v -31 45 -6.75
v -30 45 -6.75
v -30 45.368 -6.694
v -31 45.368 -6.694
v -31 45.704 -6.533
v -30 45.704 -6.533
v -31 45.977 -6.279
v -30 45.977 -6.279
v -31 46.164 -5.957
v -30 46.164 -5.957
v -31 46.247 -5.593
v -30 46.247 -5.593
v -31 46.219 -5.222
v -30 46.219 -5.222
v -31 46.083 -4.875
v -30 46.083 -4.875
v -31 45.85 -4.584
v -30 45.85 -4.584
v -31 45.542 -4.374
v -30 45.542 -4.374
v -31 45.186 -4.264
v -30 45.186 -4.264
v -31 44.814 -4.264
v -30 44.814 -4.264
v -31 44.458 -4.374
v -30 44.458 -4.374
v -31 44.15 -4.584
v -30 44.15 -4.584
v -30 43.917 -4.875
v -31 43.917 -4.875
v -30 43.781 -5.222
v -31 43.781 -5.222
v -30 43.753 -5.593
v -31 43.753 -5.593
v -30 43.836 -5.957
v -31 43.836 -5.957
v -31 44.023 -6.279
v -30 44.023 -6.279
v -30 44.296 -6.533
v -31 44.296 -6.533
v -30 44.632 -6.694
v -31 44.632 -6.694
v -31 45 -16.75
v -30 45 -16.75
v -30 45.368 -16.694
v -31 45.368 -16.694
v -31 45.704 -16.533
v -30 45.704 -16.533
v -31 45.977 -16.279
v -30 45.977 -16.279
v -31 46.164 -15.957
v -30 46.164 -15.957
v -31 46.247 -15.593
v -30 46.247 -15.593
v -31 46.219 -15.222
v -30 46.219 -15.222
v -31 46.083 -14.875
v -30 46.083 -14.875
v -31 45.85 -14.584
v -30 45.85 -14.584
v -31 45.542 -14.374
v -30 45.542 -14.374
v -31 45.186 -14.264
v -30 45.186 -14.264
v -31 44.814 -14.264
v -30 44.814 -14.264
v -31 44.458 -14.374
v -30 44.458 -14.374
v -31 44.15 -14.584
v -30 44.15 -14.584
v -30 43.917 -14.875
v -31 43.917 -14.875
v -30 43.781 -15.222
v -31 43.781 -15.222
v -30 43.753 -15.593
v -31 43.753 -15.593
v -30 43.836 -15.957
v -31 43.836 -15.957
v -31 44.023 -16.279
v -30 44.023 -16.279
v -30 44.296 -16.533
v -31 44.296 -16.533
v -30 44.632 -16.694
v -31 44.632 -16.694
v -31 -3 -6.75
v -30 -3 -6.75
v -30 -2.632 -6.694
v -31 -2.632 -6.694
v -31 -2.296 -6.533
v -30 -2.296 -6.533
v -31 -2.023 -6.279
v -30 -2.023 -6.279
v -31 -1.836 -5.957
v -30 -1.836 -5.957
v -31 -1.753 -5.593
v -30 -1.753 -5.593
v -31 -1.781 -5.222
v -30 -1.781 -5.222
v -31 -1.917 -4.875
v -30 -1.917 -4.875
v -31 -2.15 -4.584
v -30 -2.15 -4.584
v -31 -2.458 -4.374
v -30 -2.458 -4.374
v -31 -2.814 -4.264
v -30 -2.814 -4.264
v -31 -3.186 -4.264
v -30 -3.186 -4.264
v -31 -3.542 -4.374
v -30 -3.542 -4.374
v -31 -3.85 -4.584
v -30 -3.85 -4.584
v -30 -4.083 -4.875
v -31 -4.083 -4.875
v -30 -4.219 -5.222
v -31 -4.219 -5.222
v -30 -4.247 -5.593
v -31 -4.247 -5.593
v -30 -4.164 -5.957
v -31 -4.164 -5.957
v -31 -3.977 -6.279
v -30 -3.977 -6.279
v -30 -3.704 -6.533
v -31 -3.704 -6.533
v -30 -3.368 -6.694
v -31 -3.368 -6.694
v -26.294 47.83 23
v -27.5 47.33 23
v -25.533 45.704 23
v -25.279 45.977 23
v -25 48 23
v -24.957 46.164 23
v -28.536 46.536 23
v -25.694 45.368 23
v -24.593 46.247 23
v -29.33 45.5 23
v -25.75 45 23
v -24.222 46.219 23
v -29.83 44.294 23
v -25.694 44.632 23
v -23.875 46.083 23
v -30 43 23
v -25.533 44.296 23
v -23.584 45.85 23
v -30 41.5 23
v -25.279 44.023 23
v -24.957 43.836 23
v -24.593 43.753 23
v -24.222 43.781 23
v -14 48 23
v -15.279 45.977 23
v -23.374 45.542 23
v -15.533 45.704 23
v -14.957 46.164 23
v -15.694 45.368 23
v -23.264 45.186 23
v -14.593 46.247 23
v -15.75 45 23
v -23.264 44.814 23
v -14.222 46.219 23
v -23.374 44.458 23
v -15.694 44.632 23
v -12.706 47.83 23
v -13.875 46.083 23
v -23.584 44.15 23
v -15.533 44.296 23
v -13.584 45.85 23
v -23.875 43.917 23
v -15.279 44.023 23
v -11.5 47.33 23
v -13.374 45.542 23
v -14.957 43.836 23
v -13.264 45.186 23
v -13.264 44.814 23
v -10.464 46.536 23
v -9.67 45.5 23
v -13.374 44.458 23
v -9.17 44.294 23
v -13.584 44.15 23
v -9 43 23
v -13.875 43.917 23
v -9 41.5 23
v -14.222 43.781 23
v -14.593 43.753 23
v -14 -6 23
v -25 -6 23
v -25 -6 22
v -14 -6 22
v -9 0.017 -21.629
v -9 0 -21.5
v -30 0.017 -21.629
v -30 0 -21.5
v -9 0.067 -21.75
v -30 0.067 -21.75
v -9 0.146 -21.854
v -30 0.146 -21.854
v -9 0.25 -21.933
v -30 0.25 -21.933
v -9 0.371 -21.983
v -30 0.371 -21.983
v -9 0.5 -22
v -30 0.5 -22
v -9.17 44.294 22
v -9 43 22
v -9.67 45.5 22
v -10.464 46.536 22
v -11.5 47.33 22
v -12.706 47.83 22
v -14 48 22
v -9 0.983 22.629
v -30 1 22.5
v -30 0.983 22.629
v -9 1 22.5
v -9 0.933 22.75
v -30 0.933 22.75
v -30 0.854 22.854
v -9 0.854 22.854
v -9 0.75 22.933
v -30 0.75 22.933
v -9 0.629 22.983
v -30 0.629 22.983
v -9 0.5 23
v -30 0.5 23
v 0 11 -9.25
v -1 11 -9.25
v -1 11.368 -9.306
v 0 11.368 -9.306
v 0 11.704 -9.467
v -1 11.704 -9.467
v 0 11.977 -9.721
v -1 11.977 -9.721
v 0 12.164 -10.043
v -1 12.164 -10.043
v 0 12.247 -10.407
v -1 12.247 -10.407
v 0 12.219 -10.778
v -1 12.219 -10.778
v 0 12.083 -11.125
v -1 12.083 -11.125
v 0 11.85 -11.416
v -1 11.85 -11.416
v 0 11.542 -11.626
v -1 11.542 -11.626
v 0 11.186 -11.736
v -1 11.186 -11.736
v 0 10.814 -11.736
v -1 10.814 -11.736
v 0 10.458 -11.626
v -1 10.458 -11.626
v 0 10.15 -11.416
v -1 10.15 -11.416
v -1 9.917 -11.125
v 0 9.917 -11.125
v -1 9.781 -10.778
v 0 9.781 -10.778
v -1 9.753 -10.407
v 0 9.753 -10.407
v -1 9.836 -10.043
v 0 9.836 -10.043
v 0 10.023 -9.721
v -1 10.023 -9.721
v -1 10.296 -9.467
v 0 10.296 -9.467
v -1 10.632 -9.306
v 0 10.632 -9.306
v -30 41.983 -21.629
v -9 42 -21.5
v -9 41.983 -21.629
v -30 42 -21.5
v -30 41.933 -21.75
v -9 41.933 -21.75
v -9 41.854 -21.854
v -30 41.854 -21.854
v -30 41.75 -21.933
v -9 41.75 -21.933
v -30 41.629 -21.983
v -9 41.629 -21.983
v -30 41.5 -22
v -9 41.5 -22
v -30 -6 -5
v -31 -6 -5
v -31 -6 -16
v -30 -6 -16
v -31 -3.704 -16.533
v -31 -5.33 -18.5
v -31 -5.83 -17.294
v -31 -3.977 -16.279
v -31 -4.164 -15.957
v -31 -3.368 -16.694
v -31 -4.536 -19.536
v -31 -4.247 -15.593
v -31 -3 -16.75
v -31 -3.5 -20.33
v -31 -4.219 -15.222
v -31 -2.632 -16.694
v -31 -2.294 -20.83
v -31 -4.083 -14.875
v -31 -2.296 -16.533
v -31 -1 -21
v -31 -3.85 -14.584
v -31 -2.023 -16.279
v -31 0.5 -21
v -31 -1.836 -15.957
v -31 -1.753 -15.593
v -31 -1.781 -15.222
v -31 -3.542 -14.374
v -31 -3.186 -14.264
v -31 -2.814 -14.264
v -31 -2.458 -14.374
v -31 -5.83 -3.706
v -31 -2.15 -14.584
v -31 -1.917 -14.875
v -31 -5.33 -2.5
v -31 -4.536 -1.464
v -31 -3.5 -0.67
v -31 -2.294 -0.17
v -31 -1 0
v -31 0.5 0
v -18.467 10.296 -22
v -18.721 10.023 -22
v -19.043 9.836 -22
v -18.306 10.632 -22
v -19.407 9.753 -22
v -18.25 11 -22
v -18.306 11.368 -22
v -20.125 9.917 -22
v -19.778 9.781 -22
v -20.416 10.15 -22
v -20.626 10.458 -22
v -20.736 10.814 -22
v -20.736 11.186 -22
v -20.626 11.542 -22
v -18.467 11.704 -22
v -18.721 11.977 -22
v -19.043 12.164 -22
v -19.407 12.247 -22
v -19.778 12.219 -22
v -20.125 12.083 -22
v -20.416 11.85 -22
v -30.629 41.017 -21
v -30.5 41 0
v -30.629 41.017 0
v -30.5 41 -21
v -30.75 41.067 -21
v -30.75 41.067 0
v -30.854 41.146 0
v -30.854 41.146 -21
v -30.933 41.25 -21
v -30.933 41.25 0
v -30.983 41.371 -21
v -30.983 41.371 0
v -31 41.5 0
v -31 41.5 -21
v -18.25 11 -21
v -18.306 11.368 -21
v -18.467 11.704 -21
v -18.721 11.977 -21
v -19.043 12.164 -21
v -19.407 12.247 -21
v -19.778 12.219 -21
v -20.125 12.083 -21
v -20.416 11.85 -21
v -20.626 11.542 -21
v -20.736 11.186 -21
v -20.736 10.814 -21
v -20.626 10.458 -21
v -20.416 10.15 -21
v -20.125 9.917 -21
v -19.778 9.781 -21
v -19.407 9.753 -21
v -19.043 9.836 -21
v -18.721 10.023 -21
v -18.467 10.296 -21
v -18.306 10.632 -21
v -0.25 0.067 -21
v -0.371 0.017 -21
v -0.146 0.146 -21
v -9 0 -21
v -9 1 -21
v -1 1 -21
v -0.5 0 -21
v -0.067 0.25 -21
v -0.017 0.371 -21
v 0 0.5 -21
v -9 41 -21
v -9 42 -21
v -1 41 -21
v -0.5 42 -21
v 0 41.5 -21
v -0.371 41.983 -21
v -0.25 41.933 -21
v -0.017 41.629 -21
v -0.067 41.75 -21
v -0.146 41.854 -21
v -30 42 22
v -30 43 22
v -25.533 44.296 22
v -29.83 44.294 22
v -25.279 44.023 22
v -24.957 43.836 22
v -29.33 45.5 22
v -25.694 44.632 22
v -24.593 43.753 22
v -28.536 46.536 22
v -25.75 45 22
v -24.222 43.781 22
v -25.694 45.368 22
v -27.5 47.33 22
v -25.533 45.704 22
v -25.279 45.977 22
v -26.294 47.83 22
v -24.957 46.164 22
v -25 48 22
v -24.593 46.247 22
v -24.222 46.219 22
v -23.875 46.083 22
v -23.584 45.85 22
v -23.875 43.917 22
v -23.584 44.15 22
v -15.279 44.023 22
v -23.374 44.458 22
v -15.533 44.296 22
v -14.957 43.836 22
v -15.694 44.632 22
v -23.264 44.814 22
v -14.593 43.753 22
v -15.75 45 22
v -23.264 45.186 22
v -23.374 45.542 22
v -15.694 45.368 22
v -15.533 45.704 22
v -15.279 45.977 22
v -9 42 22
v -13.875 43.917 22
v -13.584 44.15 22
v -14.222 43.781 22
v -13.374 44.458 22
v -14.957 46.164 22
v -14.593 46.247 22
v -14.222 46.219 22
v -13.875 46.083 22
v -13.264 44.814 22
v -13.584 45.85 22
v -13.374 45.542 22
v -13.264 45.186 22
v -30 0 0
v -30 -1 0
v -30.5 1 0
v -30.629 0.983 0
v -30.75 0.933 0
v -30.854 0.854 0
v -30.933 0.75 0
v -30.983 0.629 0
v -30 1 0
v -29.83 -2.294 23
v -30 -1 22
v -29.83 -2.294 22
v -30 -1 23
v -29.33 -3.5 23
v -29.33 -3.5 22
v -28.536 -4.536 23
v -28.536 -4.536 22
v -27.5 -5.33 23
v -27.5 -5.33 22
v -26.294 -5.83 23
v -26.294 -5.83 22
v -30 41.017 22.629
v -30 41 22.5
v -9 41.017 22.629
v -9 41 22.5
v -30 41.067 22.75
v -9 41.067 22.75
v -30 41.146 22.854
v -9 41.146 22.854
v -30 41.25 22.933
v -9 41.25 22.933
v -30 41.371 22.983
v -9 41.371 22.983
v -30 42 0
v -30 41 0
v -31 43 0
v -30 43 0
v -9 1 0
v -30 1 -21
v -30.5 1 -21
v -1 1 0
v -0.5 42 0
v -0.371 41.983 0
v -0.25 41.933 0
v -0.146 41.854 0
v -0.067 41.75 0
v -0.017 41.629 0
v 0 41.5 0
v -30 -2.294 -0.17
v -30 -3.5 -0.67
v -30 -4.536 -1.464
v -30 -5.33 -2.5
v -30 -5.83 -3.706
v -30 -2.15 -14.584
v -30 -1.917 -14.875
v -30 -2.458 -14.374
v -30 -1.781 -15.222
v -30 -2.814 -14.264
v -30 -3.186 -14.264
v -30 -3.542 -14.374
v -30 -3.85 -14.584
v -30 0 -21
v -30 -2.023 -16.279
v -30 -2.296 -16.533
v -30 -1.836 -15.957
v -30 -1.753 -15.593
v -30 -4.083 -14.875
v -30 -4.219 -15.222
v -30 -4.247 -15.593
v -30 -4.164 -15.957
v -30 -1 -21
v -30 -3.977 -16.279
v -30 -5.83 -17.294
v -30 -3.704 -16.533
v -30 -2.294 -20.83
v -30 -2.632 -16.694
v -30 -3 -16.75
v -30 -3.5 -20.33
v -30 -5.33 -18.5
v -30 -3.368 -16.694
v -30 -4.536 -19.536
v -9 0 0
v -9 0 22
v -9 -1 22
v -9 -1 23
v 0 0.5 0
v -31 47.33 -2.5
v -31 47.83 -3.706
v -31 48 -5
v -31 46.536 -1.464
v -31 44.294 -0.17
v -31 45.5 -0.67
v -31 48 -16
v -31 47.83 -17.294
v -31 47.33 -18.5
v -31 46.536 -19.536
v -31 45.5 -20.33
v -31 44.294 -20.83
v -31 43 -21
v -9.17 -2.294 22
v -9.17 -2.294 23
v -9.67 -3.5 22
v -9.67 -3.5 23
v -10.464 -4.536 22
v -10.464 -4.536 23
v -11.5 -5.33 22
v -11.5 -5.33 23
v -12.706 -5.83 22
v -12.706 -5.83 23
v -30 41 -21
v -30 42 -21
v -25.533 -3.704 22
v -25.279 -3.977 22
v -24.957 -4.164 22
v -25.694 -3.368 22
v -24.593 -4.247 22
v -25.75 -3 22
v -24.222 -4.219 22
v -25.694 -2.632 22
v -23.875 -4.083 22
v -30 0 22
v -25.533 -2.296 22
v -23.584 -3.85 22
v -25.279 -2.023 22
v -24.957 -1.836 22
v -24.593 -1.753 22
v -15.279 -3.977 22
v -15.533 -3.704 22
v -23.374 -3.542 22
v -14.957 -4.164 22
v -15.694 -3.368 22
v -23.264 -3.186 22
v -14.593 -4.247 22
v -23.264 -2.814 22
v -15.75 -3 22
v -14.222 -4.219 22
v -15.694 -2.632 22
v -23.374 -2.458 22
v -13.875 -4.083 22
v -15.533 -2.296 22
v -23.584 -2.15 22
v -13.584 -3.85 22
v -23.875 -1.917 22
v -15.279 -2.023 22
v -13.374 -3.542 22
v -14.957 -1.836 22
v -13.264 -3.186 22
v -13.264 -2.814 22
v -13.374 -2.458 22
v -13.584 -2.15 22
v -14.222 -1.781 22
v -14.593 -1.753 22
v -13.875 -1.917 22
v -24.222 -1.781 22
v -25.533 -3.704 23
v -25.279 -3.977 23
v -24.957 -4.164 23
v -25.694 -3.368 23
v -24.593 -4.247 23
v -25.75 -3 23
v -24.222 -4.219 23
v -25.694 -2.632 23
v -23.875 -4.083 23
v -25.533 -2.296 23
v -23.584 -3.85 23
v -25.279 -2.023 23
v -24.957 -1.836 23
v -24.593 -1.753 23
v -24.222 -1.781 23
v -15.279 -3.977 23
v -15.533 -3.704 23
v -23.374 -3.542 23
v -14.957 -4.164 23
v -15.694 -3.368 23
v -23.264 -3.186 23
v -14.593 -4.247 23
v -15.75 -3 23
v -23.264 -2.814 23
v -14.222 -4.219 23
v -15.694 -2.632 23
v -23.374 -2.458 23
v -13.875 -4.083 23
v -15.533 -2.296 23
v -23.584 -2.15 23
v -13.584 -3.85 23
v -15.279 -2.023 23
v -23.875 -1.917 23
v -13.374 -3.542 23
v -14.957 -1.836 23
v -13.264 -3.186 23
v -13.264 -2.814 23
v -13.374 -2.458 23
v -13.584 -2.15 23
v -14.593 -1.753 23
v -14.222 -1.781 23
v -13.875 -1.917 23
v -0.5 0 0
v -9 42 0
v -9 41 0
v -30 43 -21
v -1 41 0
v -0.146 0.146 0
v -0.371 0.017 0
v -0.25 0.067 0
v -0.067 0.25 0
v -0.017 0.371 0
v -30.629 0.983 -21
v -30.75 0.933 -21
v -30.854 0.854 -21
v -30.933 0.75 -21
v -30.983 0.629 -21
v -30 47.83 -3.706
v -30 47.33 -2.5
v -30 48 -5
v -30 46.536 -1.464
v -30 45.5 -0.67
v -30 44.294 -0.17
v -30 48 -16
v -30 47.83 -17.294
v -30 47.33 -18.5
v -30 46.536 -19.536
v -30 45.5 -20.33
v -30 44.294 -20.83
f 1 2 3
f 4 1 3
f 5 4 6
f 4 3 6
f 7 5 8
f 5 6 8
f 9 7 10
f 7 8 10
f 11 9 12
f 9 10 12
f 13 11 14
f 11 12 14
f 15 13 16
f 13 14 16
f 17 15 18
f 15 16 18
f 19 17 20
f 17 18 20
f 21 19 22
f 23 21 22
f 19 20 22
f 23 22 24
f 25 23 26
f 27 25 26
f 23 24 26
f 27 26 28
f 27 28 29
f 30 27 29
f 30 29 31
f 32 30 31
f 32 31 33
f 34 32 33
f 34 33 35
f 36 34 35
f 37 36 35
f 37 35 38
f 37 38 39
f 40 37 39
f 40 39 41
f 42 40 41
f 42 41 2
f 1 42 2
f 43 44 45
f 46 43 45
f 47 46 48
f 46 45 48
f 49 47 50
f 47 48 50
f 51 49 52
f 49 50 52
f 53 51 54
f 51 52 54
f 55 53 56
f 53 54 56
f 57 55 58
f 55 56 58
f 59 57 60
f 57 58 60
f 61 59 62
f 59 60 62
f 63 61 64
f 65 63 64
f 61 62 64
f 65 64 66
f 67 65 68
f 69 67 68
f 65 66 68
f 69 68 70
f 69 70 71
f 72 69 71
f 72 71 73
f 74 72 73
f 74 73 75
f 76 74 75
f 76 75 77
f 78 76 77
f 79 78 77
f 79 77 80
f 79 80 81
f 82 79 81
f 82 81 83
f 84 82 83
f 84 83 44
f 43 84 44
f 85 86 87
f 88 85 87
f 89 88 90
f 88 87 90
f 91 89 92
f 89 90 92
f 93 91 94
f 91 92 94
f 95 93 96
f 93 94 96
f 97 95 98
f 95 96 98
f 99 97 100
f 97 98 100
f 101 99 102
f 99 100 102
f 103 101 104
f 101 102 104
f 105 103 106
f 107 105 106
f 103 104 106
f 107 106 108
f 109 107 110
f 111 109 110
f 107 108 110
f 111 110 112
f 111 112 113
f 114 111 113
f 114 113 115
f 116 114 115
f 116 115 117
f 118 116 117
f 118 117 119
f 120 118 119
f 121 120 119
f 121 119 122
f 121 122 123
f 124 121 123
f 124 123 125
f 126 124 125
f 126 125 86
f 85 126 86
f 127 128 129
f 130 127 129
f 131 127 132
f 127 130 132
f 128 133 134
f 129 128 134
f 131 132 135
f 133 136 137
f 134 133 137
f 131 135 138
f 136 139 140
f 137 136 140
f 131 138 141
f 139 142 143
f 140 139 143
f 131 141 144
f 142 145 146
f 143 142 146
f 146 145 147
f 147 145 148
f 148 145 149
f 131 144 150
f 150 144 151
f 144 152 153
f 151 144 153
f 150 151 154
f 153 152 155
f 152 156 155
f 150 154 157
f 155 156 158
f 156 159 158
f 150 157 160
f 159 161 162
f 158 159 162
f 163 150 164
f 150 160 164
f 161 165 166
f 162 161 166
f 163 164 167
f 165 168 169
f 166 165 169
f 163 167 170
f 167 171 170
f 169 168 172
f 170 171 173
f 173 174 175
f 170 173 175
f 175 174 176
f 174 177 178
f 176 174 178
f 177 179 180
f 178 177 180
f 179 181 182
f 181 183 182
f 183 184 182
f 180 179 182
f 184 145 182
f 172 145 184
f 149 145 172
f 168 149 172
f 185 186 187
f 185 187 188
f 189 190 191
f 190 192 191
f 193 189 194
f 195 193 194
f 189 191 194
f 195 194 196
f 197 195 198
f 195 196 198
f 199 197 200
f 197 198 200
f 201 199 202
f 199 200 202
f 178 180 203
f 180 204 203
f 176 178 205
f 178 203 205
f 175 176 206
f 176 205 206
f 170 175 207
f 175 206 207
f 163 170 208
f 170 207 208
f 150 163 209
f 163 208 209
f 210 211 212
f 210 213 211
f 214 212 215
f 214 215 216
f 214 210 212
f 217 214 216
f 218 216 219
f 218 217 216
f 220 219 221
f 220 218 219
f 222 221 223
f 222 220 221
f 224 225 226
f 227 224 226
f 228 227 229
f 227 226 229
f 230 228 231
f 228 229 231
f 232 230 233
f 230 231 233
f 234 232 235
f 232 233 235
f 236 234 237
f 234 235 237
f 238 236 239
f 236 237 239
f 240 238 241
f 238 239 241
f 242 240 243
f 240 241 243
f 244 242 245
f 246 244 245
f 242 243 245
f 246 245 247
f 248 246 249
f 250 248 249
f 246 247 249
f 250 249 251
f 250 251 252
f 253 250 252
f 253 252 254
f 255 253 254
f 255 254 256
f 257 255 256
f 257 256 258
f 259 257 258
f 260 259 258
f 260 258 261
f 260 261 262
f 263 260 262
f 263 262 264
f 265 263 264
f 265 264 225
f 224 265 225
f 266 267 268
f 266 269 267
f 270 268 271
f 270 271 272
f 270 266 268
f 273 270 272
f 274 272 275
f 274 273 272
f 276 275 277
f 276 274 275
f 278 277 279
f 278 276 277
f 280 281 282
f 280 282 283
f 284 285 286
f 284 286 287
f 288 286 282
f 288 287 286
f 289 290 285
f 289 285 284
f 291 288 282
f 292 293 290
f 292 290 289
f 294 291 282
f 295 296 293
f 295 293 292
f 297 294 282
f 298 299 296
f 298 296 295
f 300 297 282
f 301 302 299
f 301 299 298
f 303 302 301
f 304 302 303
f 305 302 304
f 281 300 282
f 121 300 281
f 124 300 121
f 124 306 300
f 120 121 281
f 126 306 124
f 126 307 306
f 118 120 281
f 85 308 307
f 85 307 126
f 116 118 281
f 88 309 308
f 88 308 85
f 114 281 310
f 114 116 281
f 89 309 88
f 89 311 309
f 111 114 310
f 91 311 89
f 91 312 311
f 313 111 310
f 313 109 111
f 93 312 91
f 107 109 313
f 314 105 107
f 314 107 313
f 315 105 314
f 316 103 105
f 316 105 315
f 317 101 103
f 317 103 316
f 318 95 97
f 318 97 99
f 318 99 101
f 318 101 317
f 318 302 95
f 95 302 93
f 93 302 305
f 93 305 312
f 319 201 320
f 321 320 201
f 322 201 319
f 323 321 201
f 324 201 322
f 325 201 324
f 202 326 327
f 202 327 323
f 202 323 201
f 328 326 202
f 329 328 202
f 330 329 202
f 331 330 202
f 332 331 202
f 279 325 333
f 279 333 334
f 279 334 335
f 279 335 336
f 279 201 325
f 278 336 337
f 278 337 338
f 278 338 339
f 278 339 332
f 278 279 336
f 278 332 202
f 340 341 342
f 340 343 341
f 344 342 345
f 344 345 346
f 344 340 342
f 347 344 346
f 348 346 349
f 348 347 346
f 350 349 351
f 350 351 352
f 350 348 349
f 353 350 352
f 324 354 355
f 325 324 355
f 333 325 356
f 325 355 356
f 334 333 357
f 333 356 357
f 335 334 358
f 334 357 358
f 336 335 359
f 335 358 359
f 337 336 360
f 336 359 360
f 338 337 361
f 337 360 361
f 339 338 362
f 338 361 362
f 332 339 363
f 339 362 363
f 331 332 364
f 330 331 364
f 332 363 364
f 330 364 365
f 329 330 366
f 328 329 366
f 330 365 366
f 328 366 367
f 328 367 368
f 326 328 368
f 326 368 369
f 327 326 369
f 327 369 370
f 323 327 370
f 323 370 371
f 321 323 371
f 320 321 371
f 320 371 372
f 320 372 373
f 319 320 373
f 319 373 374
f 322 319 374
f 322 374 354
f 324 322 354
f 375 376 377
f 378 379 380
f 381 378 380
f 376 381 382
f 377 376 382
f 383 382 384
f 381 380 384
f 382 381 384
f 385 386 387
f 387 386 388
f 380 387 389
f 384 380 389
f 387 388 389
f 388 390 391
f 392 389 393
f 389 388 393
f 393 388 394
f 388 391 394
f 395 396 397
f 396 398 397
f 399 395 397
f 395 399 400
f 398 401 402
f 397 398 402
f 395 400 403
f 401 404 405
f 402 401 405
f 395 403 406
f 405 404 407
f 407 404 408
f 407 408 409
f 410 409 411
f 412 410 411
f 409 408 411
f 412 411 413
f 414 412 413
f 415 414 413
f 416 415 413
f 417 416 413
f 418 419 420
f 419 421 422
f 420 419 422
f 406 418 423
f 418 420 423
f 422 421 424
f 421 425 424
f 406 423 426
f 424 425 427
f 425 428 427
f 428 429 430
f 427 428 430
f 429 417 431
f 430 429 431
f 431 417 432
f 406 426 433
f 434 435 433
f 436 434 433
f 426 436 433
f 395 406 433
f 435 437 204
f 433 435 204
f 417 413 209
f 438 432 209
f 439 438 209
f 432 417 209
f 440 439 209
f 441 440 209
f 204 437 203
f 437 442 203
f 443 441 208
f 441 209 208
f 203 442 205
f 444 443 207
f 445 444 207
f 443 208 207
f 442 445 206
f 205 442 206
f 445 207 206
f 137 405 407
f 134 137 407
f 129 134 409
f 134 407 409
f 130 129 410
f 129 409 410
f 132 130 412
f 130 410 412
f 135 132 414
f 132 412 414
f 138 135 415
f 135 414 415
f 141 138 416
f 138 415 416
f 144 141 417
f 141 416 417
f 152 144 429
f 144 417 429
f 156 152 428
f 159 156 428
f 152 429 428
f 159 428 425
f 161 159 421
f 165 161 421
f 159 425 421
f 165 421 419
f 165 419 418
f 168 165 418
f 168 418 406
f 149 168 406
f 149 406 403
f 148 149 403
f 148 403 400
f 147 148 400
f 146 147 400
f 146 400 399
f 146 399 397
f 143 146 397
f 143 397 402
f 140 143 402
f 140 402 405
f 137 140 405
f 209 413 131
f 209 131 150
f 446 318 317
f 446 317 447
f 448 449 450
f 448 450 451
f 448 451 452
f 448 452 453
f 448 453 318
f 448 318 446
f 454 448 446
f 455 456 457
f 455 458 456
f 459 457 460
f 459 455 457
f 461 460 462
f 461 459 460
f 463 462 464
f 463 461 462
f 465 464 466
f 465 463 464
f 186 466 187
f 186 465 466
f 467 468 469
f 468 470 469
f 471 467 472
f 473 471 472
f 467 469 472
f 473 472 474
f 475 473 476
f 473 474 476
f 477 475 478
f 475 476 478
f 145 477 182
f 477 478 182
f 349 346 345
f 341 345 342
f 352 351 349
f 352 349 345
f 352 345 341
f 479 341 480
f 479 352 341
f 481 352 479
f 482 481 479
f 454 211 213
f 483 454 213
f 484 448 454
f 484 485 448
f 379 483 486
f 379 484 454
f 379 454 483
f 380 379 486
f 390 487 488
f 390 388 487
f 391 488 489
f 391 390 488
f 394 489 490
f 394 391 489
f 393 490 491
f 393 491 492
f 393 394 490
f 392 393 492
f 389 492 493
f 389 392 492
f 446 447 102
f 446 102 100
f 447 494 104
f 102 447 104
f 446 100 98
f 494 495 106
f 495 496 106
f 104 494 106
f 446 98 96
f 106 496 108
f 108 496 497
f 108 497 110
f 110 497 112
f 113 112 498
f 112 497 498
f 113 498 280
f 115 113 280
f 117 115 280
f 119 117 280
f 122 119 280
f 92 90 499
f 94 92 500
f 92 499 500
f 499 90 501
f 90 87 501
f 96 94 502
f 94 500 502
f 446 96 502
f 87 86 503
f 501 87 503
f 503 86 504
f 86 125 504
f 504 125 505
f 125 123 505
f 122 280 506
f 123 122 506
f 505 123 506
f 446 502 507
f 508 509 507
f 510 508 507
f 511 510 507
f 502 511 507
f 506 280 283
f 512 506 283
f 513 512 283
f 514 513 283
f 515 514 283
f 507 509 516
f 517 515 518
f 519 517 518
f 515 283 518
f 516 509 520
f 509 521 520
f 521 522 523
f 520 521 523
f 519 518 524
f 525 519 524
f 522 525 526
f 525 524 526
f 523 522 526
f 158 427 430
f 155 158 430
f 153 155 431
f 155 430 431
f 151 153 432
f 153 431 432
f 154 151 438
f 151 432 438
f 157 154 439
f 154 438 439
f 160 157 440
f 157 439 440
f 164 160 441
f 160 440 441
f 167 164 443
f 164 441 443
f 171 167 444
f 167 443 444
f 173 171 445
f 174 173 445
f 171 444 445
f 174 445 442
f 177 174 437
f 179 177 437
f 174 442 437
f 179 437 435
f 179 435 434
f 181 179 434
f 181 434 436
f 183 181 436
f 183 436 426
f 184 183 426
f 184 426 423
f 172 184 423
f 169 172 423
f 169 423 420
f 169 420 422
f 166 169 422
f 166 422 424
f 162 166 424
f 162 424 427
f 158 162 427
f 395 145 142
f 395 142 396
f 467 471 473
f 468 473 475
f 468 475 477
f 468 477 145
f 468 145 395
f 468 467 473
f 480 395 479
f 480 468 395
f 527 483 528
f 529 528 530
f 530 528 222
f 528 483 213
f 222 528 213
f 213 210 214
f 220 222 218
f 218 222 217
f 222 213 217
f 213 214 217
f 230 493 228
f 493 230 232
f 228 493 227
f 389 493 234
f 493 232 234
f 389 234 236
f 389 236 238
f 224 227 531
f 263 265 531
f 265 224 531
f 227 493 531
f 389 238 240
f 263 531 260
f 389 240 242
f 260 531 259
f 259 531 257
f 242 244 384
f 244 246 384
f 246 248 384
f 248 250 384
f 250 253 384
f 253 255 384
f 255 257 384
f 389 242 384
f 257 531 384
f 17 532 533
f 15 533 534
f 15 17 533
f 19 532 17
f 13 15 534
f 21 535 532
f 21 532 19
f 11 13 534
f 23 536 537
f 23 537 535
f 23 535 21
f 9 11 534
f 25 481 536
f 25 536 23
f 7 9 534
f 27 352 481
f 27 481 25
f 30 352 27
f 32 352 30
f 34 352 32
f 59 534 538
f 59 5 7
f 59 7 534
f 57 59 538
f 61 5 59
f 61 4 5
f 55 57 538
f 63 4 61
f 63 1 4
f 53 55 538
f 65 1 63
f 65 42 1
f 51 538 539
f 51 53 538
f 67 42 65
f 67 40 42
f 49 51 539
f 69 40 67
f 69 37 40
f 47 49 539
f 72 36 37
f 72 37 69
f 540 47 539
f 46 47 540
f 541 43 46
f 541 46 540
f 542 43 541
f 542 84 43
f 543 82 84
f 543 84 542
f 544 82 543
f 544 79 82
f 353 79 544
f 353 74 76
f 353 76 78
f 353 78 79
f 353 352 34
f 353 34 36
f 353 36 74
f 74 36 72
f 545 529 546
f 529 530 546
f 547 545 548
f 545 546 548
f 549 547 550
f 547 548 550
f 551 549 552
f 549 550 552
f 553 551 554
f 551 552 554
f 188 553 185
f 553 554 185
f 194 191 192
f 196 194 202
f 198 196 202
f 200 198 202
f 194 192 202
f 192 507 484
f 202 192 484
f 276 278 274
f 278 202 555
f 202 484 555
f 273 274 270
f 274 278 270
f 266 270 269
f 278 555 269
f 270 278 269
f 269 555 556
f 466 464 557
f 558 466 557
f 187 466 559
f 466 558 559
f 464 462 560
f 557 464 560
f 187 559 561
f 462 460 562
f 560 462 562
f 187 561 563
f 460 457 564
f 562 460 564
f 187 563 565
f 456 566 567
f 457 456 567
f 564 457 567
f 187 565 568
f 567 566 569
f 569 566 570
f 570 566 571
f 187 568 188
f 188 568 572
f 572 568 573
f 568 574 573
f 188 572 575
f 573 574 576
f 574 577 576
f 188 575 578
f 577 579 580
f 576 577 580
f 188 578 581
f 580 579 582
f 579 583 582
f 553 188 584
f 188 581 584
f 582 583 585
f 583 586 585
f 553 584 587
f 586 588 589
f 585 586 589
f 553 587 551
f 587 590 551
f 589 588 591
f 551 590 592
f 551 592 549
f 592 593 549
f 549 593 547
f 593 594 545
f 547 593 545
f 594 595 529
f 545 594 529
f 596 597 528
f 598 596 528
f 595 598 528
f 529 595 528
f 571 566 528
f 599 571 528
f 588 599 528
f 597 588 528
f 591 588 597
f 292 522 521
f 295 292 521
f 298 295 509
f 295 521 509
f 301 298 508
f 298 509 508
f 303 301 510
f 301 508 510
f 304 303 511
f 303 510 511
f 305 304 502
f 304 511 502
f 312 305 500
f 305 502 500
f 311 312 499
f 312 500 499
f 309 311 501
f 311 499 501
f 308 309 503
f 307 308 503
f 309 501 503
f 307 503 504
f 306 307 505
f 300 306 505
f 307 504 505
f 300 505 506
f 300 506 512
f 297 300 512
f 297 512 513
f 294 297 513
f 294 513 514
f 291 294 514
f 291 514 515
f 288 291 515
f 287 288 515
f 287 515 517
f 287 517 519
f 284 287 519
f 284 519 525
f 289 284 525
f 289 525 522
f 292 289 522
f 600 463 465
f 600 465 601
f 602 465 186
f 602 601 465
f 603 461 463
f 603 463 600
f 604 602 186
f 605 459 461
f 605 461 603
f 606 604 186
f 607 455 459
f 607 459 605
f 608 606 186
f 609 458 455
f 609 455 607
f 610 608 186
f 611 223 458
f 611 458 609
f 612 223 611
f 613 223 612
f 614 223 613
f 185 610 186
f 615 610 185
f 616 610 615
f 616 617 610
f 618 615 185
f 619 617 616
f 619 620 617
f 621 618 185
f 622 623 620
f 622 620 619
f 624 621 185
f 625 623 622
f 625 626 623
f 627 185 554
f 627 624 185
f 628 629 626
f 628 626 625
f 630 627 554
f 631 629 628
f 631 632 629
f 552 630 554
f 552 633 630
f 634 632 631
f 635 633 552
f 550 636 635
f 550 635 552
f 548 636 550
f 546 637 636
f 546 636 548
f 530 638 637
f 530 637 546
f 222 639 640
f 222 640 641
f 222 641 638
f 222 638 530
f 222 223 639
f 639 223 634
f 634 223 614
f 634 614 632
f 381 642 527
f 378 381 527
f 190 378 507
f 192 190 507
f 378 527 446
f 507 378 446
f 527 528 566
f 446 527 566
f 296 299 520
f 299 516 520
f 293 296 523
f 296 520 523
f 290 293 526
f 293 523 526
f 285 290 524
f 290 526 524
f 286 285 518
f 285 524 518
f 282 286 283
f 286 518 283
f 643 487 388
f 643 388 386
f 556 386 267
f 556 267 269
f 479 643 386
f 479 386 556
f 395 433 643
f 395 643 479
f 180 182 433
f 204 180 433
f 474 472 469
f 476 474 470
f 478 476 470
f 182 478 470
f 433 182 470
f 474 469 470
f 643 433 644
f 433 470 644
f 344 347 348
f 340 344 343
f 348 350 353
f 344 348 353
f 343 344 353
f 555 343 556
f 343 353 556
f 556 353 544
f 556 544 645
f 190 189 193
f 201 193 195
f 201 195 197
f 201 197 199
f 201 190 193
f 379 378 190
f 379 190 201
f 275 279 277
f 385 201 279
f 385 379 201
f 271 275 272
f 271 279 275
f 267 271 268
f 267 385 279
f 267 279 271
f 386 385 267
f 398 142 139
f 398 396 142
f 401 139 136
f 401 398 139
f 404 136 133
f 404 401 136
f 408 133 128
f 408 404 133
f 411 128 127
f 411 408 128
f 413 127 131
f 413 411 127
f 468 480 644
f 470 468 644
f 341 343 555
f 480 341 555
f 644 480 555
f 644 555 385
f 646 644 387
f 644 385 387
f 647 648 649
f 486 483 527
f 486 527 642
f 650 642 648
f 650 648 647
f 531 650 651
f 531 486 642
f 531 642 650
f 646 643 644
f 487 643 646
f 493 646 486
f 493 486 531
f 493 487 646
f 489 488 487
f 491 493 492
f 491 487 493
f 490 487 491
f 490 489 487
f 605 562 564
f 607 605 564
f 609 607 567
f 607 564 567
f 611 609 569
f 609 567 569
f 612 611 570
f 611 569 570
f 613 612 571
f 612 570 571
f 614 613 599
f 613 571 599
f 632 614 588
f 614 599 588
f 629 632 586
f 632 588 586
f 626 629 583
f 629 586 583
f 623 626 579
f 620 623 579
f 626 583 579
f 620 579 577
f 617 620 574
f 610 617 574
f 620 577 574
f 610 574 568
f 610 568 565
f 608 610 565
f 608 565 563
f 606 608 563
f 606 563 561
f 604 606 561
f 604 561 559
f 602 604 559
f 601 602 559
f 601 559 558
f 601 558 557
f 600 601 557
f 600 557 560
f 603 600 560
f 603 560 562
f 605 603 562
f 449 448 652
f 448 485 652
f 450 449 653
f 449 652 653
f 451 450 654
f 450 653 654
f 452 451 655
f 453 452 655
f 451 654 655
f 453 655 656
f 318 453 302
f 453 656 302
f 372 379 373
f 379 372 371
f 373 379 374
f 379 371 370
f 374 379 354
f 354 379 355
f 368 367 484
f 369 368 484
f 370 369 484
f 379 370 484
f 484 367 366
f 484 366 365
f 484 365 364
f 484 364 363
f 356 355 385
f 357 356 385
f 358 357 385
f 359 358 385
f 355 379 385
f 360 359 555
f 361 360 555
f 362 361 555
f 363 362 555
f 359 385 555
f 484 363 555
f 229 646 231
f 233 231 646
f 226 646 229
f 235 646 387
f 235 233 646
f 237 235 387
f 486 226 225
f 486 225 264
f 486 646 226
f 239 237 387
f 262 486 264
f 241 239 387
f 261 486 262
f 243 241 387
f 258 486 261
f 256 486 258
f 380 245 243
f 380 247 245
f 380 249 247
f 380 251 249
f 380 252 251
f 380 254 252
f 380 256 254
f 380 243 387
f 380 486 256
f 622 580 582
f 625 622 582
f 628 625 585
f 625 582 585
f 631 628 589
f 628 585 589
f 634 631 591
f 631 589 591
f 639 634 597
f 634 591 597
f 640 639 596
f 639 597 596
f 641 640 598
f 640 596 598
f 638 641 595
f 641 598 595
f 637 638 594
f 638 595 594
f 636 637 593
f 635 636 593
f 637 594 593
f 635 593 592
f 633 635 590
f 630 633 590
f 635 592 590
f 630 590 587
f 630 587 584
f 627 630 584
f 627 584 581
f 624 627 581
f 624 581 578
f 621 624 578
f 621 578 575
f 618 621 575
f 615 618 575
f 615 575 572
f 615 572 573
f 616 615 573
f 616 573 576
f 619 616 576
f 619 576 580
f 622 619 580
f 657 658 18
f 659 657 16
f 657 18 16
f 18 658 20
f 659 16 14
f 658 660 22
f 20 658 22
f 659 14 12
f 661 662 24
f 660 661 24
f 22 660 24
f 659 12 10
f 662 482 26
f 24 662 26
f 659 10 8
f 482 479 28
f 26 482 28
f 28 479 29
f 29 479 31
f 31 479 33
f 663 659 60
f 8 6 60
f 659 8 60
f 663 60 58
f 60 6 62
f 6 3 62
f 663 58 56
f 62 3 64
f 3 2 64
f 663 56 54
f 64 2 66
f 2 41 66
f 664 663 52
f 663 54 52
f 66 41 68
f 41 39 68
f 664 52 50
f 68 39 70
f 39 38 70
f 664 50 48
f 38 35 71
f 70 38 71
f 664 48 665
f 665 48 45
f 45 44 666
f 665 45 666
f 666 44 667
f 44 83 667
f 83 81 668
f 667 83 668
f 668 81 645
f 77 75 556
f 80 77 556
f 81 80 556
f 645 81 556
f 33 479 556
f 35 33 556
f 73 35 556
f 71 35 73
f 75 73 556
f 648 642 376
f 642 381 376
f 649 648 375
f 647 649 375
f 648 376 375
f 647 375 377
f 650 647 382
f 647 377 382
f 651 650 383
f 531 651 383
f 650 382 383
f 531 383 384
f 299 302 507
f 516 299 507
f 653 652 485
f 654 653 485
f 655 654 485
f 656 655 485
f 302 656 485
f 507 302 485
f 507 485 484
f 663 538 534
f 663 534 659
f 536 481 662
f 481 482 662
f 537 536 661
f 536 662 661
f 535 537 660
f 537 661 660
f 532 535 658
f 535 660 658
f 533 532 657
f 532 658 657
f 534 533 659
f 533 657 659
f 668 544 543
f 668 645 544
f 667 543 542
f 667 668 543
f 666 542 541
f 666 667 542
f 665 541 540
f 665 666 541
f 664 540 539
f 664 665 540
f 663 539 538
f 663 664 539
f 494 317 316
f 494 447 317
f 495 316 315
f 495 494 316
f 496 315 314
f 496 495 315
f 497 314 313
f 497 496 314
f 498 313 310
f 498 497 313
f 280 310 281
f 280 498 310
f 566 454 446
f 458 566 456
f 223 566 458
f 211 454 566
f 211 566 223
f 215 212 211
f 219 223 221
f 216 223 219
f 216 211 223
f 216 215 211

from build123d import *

# Parameters (mm, degrees)
SKETCH_1_W         = 31
SKETCH_1_H         = 21
EXTRUDE_1_DEPTH    = 42
SHELL_1_T          = -1
SKETCH_2_W         = 5
SKETCH_2_H         = 21
EXTRUDE_2_DEPTH    = 6
SHELL_START        = 42
SHELL_2_OUTLINE_W  = 4
SHELL_2_OUTLINE_H  = 21
SHELL_2_DEPTH      = 6
SKETCH_3_W         = 5
SKETCH_3_H         = 21
EXTRUDE_3_DEPTH    = 6
SHELL_START_2      = -6
SHELL_3_OUTLINE_W  = 4
SHELL_3_OUTLINE_H  = 21
SHELL_3_DEPTH      = 6
SKETCH_4_W         = 21
SKETCH_4_H         = 1
EXTRUDE_4_DEPTH    = 23
SKETCH_5_W         = 21
SKETCH_5_H         = 5
EXTRUDE_5_DEPTH    = 6
SHELL_START_3      = 18
SHELL_4_OUTLINE_W  = 21
SHELL_4_OUTLINE_H  = 6
SHELL_4_DEPTH      = 4
SKETCH_6_W         = 21
SKETCH_6_H         = 5
EXTRUDE_6_DEPTH    = 6
SHELL_5_OUTLINE_W  = 21
SHELL_5_OUTLINE_H  = 6
SHELL_5_DEPTH      = 4
SKETCH_8_W         = 21
SKETCH_8_H         = 42
EXTRUDE_7_DEPTH    = 1
HOLE_WIZARD_M3_1_D = 2.5
HOLE_WIZARD_M3_2_D = 2.5
HOLE_WIZARD_M3_3_D = 2.5
HOLE_WIZARD_M3_4_D = 2.5
FILLET_2_R         = 0.5
FILLET_3_R         = 5


# Read off the part's stored shape, not the designer's step: 抽壳2, 抽壳3, 抽壳4, 抽壳5
with BuildPart() as part:
    # 草图1 → 凸台-拉伸1 (new body)
    with BuildSketch(Plane(origin=(0, 0, 0), x_dir=(1, 0, 0), z_dir=(0, 1, 0))):
        with Locations((-15.5, 10.5)):
            Rectangle(SKETCH_1_W, SKETCH_1_H)
    extrude(amount=EXTRUDE_1_DEPTH)

    # 抽壳1
    shell_1_openings = [part.faces().sort_by_distance(p)[0] for p in [
        (-15.5, 21, 0),
        (-31, 21, -10.5),
        (-15.5, 21, -21),
    ]]
    offset(amount=SHELL_1_T, openings=shell_1_openings, kind=Kind.INTERSECTION)

    # 草图2 → 凸台-拉伸2 (add)
    with BuildSketch(Plane(origin=(0, 42, 0), x_dir=(1, 0, 0), z_dir=(0, 1, 0))):
        with Locations((-28.5, 10.5)):
            Rectangle(SKETCH_2_W, SKETCH_2_H)
    extrude(amount=EXTRUDE_2_DEPTH)

    # 抽壳2 outline → 抽壳2 (cut)
    with BuildSketch(Plane(origin=(0, 0, 0), x_dir=(1, 0, 0), z_dir=(0, 1, 0)).offset(SHELL_START)):
        with Locations((-28, 10.5)):
            Rectangle(SHELL_2_OUTLINE_W, SHELL_2_OUTLINE_H)
    extrude(amount=SHELL_2_DEPTH, mode=Mode.SUBTRACT)

    # 草图3 → 凸台-拉伸3 (add)
    with BuildSketch(Plane.XZ):
        with Locations((-28.5, -10.5)):
            Rectangle(SKETCH_3_W, SKETCH_3_H)
    extrude(amount=EXTRUDE_3_DEPTH)

    # 抽壳3 outline → 抽壳3 (cut)
    with BuildSketch(Plane(origin=(0, 0, 0), x_dir=(1, 0, 0), z_dir=(0, 1, 0)).offset(SHELL_START_2)):
        with Locations((-28, 10.5)):
            Rectangle(SHELL_3_OUTLINE_W, SHELL_3_OUTLINE_H)
    extrude(amount=SHELL_3_DEPTH, mode=Mode.SUBTRACT)

    # 草图4 → 凸台-拉伸4 (add)
    with BuildSketch(Plane.XY):
        with Locations((-19.5, 41.5)):
            Rectangle(SKETCH_4_W, SKETCH_4_H)
        with Locations((-19.5, 0.5)):
            Rectangle(SKETCH_4_W, SKETCH_4_H)
    extrude(amount=EXTRUDE_4_DEPTH)

    # 草图5 → 凸台-拉伸5 (add)
    with BuildSketch(Plane(origin=(0, 42, 0), x_dir=(1, 0, 0), z_dir=(0, 1, 0))):
        with Locations((-19.5, -20.5)):
            Rectangle(SKETCH_5_W, SKETCH_5_H)
    extrude(amount=EXTRUDE_5_DEPTH)

    # 抽壳4 outline → 抽壳4 (cut)
    with BuildSketch(Plane.XY.offset(SHELL_START_3)):
        with Locations((-19.5, 45)):
            Rectangle(SHELL_4_OUTLINE_W, SHELL_4_OUTLINE_H)
    extrude(amount=SHELL_4_DEPTH, mode=Mode.SUBTRACT)

    # 草图6 → 凸台-拉伸6 (add)
    with BuildSketch(Plane.XZ):
        with Locations((-19.5, 20.5)):
            Rectangle(SKETCH_6_W, SKETCH_6_H)
    extrude(amount=EXTRUDE_6_DEPTH)

    # 抽壳5 outline → 抽壳5 (cut)
    with BuildSketch(Plane.XY.offset(SHELL_START_3)):
        with Locations((-19.5, -3)):
            Rectangle(SHELL_5_OUTLINE_W, SHELL_5_OUTLINE_H)
    extrude(amount=SHELL_5_DEPTH, mode=Mode.SUBTRACT)

    # 草图8 → 凸台-拉伸7 (add)
    with BuildSketch(Plane(origin=(0, 0, -21), x_dir=(-1, 0, 0), z_dir=(0, 0, -1))):
        with Locations((19.5, 21)):
            Rectangle(SKETCH_8_W, SKETCH_8_H)
    extrude(amount=EXTRUDE_7_DEPTH)

    # M3 螺纹孔1 (through all)
    with Locations(Plane.XY.offset(23)):
        with Locations((-24.5, 45), (-14.5, 45), (-24.5, -3), (-14.5, -3)):
            Hole(HOLE_WIZARD_M3_1_D / 2)

    # M3 螺纹孔2 (through all)
    with Locations(Plane.ZY.offset(31)):
        with Locations((-5.5, 45), (-15.5, 45), (-15.5, -3), (-5.5, -3)):
            Hole(HOLE_WIZARD_M3_2_D / 2)

    # M3 螺纹孔3 (through all)
    with Locations(Plane(origin=(0, 0, 0), x_dir=(0, 0, -1), z_dir=(1, 0, 0))):
        with Locations((10.5, 11)):
            Hole(HOLE_WIZARD_M3_3_D / 2)

    # M3 螺纹孔4 (through all)
    with Locations(Plane(origin=(0, 0, -22), x_dir=(-1, 0, 0), z_dir=(0, 0, -1))):
        with Locations((19.5, 11)):
            Hole(HOLE_WIZARD_M3_4_D / 2)

    # 圆角2
    fillet_2_edges = [part.edges().sort_by_distance(p)[0] for p in [
        (-19.5, 42, -22),
        (-19.5, 0, -22),
        (-31, 1, -10.5),
        (-31, 41, -10.5),
        (0, 42, -10.5),
        (0, 0, -10.5),
        (-19.5, 41, 23),
        (-19.5, 1, 23),
    ]]
    fillet(fillet_2_edges, radius=FILLET_2_R)

    # 圆角3
    fillet_3_edges = [part.edges().sort_by_distance(p)[0] for p in [
        (-30, 48, 22.5),
        (-9, 48, 22.5),
        (-30, -6, 22.5),
        (-9, -6, 22.5),
        (-30.5, 48, -21),
        (-30.5, 48, 0),
        (-30.5, -6, -21),
        (-30.5, -6, 0),
    ]]
    fillet(fillet_3_edges, radius=FILLET_3_R)


solid = part.part
